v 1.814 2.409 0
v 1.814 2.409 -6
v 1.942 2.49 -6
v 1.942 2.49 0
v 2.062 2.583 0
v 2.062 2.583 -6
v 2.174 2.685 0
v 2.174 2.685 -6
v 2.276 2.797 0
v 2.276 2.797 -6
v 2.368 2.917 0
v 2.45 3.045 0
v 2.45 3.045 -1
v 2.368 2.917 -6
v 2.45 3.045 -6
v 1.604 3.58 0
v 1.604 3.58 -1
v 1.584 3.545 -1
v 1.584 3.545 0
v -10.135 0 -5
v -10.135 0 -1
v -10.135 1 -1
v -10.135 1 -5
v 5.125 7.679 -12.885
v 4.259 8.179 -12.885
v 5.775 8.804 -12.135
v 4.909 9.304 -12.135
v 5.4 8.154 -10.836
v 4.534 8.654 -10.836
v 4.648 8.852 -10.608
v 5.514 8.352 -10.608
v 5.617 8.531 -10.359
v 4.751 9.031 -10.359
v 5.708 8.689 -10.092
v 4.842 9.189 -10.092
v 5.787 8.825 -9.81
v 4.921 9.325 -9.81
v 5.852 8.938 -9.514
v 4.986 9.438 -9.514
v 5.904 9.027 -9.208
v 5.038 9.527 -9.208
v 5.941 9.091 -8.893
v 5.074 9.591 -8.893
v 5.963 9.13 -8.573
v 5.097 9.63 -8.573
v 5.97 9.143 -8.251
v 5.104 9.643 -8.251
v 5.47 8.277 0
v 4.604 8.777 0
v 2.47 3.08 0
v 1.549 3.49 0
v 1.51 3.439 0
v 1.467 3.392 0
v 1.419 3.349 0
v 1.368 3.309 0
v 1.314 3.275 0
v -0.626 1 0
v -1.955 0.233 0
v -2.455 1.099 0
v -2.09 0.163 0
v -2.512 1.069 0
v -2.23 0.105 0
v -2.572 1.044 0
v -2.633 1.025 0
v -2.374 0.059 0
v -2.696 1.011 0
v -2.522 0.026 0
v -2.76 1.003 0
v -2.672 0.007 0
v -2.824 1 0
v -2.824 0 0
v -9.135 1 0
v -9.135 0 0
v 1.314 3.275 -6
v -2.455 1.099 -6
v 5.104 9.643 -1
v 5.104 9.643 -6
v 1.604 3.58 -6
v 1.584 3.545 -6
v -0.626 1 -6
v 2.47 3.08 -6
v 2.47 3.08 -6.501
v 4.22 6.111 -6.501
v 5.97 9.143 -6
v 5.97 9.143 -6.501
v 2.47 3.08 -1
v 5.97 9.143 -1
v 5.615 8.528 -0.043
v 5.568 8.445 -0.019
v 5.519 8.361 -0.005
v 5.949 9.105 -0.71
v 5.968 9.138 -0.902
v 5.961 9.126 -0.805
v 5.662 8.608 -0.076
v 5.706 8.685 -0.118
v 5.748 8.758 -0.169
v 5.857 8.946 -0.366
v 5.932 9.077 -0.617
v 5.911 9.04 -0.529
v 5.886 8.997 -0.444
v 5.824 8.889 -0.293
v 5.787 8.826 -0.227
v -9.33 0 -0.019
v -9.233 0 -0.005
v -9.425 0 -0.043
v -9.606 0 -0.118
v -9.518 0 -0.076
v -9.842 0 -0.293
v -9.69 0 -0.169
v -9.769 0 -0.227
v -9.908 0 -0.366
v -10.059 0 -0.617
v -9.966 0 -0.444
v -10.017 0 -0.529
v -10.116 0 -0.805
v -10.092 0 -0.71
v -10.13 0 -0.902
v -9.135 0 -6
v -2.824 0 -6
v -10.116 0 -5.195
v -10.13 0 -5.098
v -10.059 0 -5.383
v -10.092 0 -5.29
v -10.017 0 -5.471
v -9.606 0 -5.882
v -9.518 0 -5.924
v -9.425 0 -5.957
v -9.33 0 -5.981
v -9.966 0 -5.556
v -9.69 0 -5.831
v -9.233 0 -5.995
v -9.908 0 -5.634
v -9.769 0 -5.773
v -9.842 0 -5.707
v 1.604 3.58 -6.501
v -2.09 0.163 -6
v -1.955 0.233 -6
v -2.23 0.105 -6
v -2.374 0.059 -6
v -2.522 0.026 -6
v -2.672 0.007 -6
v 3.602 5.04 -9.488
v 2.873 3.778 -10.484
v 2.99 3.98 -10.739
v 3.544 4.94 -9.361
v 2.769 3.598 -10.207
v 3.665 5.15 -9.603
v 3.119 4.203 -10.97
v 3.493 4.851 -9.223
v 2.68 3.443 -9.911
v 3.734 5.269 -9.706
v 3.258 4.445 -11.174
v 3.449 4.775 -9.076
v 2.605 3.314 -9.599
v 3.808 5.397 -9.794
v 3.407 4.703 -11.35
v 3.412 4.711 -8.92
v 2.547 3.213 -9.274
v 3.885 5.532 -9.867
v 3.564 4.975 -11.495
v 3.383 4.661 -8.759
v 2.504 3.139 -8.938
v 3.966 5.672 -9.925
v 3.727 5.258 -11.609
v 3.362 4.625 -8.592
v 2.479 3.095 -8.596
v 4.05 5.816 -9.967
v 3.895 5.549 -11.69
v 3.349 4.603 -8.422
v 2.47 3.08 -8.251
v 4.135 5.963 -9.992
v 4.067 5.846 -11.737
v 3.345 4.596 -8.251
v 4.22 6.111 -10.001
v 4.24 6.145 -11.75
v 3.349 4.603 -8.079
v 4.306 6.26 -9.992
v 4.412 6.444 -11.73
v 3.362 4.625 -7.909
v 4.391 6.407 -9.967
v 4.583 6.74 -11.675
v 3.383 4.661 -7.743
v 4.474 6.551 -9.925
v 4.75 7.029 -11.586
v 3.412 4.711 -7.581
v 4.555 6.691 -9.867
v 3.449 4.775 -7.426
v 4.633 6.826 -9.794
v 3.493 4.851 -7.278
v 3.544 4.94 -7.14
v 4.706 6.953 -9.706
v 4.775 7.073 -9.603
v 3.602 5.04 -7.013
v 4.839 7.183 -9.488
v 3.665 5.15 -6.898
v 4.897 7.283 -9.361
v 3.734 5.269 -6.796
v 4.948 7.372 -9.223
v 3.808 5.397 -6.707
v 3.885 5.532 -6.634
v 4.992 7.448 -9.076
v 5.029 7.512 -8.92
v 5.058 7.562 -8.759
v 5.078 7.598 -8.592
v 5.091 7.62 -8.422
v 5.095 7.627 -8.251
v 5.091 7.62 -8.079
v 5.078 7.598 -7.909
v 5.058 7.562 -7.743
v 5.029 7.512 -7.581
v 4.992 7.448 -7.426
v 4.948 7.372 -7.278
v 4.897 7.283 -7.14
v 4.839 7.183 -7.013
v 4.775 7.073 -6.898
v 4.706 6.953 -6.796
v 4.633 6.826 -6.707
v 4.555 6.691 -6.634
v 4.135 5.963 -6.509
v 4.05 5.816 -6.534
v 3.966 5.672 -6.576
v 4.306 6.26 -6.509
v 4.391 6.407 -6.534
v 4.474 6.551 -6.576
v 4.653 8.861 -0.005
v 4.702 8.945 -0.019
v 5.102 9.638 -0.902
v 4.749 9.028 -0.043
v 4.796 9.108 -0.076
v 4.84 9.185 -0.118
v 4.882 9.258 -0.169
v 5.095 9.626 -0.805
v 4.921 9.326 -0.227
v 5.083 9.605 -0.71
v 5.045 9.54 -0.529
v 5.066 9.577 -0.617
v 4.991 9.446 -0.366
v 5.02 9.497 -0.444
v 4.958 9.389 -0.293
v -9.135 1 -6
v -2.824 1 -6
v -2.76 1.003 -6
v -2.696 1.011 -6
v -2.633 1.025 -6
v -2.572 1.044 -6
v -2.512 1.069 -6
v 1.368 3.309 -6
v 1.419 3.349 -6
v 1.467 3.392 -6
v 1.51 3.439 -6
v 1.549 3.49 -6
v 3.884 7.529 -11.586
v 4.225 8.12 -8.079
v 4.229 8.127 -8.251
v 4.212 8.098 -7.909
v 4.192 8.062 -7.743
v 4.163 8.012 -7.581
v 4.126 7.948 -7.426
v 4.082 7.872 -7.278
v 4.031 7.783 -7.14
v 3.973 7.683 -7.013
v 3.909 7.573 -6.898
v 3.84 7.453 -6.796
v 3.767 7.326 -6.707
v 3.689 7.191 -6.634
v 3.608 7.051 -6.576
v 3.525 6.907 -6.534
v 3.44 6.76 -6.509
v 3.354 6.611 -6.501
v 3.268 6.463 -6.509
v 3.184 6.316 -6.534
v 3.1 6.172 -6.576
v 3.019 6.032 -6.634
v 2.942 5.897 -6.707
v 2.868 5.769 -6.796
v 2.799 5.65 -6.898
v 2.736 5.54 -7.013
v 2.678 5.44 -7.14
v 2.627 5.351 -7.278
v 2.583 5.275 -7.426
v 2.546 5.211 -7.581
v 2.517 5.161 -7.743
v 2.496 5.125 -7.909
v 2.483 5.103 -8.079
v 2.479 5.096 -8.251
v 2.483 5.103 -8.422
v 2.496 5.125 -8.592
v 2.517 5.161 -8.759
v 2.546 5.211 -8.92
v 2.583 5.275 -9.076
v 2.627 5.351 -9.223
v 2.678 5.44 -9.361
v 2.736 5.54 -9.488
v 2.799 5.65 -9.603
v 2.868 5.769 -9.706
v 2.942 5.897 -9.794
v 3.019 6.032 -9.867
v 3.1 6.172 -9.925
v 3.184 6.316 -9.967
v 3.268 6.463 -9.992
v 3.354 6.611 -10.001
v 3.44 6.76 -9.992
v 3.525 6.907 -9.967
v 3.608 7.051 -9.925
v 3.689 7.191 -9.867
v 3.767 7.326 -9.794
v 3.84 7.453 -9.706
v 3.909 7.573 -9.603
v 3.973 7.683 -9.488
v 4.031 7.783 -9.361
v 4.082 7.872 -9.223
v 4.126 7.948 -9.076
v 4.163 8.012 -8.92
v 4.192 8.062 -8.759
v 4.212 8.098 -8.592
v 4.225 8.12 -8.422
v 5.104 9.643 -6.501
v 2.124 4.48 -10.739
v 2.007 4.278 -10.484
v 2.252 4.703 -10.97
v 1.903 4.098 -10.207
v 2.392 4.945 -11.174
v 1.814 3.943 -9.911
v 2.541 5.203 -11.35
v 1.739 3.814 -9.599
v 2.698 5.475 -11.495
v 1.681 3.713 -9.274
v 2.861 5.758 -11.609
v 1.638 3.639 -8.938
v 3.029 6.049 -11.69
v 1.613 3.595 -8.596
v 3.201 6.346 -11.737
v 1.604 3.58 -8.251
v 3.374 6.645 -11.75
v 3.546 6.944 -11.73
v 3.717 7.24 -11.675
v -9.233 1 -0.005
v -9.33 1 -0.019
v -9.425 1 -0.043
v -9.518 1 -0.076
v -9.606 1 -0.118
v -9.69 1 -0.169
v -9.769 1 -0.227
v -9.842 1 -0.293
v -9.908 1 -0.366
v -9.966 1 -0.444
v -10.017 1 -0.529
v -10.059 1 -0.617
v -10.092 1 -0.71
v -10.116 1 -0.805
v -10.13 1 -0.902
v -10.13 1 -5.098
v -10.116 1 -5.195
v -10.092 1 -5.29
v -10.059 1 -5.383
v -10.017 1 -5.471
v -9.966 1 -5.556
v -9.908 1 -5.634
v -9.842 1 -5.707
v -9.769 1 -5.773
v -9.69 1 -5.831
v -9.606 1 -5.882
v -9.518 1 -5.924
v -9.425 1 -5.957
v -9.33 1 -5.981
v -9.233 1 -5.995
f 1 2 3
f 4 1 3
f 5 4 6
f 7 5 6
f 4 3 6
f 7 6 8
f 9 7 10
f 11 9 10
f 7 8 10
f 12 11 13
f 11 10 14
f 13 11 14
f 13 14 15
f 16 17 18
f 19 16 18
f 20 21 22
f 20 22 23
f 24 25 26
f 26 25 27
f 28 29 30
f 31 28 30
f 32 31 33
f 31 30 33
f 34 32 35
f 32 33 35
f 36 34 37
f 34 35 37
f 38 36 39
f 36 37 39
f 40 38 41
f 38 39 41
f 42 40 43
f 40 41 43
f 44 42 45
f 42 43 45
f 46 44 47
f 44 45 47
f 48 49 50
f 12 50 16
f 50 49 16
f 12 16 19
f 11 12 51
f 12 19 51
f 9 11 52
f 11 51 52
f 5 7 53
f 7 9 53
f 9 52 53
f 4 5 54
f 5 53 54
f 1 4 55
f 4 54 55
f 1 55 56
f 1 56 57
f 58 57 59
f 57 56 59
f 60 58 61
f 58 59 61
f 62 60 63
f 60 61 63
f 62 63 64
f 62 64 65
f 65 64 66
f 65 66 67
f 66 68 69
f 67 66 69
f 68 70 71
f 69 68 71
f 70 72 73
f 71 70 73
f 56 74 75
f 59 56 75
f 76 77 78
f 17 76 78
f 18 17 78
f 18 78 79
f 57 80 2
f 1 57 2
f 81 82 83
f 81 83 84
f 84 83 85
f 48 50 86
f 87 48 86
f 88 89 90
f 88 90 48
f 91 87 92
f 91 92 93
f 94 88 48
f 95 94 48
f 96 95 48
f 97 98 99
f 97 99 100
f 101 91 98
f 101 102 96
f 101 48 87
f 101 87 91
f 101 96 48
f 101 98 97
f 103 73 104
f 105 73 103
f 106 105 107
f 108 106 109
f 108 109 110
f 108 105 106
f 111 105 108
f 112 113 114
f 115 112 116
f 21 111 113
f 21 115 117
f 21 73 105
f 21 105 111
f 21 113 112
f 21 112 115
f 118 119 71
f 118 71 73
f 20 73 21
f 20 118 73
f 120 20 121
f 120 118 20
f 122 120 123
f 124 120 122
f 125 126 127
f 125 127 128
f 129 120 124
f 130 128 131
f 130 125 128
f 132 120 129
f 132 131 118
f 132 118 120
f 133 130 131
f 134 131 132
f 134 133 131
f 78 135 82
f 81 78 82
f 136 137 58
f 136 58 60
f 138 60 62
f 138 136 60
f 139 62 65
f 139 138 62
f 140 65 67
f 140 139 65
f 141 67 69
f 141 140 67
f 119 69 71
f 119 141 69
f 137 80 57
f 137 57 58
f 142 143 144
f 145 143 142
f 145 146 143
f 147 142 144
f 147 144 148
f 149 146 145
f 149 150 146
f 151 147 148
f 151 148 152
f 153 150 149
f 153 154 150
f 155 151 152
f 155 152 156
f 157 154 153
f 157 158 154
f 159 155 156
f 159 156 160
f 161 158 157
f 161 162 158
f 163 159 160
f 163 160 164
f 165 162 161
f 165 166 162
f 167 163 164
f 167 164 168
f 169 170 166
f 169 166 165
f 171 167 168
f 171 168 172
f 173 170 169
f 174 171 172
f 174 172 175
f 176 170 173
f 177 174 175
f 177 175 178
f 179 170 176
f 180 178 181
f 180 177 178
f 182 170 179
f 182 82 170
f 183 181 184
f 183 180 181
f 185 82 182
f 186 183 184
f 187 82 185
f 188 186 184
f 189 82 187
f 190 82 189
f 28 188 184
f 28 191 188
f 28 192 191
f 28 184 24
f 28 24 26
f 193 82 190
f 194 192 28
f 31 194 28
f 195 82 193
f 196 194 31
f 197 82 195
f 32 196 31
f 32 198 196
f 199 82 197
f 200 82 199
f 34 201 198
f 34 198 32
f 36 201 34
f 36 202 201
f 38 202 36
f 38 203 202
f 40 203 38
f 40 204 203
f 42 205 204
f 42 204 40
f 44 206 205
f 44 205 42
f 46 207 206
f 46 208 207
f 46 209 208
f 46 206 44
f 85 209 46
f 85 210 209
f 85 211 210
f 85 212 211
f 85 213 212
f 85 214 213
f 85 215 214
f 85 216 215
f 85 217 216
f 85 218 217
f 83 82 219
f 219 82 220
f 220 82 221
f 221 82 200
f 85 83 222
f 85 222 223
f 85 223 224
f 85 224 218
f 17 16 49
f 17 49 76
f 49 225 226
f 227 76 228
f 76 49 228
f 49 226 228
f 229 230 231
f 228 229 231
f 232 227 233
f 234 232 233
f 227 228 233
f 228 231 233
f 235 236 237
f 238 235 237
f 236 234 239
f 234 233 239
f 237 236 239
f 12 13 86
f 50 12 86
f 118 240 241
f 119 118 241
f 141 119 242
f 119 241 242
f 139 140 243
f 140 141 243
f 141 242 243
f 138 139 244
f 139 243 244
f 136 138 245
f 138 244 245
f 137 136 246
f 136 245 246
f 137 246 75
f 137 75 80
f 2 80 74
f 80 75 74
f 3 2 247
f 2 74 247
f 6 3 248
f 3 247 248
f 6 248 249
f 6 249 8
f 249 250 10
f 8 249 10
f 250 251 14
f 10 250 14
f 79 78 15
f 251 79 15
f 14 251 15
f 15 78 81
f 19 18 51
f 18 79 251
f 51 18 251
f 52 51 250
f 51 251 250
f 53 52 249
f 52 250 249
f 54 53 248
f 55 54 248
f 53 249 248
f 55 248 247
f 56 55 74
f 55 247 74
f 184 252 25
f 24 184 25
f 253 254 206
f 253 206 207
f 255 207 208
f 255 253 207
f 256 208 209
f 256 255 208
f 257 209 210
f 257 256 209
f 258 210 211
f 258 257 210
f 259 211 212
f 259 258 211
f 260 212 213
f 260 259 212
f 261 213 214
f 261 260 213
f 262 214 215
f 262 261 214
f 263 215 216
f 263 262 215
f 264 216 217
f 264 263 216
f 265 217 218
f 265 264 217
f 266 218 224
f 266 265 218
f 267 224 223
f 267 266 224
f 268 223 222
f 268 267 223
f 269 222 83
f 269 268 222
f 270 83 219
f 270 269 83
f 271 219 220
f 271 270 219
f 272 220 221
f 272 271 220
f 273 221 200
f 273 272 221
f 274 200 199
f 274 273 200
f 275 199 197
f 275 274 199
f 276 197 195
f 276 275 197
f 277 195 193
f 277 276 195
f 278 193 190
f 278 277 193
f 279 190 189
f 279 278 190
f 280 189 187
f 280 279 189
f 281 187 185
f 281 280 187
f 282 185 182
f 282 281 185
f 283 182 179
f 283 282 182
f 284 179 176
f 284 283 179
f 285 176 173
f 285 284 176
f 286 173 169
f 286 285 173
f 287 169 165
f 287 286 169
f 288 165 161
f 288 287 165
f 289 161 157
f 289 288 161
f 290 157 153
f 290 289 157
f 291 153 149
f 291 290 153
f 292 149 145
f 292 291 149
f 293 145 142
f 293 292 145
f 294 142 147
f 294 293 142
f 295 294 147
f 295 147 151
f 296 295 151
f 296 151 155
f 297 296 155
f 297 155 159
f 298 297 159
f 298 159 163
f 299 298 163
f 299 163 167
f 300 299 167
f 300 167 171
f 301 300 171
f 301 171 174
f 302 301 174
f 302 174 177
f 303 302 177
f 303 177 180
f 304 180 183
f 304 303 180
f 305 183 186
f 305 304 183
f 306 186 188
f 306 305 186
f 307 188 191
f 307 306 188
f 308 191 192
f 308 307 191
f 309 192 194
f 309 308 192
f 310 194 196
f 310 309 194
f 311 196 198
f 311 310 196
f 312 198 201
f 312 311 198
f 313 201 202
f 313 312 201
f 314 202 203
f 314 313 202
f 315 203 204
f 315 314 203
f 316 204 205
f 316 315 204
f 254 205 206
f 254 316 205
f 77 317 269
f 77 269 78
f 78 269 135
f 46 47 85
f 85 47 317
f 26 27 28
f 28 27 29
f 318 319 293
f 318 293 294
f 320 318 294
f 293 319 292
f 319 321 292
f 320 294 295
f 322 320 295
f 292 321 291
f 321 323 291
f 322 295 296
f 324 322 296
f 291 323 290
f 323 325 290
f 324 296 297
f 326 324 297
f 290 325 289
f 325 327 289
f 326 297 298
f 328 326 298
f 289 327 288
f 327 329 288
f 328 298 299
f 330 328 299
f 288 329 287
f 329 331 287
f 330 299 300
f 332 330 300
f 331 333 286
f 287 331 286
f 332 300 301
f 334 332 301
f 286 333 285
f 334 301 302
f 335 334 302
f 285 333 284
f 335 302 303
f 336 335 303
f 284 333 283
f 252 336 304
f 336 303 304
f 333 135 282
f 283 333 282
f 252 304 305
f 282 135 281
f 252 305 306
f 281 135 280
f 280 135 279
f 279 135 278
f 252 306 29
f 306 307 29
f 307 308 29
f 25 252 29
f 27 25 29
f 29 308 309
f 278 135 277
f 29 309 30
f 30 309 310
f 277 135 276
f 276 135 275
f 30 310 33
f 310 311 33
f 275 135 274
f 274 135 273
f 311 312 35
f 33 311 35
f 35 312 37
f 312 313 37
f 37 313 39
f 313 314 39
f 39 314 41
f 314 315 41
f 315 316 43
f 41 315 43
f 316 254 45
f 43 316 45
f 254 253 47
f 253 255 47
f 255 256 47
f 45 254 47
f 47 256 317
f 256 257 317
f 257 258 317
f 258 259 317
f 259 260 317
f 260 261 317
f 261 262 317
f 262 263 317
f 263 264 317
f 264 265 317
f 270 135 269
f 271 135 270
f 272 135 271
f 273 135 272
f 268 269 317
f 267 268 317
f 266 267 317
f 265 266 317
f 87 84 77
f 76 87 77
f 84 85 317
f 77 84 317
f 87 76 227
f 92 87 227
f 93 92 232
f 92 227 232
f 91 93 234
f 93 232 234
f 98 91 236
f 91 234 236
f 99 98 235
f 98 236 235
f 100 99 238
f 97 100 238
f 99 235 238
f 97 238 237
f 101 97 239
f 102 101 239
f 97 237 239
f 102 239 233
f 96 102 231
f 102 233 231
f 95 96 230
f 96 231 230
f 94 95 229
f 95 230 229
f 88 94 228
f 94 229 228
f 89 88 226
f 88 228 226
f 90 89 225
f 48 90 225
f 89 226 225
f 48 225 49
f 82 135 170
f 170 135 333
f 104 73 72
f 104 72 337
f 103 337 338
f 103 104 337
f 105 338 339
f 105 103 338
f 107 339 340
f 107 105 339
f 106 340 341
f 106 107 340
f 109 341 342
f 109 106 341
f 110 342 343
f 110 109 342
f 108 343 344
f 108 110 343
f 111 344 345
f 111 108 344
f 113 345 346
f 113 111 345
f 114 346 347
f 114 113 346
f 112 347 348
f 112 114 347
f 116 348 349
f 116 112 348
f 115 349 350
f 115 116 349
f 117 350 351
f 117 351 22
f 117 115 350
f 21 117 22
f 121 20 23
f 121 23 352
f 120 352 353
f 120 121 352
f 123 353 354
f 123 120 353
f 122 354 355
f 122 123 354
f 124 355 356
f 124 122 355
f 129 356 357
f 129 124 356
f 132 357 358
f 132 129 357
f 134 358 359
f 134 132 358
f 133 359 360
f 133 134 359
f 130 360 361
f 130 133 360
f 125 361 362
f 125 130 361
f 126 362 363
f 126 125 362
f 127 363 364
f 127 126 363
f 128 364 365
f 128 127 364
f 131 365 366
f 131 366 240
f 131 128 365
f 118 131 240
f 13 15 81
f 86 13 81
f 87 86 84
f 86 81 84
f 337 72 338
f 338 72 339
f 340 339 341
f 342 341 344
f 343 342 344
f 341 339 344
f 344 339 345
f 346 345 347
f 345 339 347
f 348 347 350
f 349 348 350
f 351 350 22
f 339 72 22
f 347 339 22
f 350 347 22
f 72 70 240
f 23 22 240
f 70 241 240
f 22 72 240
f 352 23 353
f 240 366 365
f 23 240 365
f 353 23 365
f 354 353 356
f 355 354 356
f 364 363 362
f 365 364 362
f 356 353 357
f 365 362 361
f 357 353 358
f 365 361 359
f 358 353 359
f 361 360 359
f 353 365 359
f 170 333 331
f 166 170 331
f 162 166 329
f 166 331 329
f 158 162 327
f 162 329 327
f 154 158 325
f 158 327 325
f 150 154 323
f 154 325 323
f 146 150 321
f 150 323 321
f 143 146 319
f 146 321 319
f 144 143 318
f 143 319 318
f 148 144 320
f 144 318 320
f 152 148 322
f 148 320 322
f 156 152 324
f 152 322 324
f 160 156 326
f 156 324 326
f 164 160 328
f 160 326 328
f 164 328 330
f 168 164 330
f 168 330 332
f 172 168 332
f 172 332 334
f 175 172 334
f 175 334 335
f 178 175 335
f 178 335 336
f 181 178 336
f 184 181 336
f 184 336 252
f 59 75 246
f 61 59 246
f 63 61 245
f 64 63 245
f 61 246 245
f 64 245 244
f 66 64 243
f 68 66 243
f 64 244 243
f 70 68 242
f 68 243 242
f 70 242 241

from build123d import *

# Parameters (mm, degrees)
SKETCH1_R                  = 1.75
BOSS_EXTRUDE1_DEPTH        = 1
BOSS_EXTRUDE2_START        = -1
BOSS_EXTRUDE2_DEPTH        = 1
SKETCHED_START             = 7.177417197
SKETCHED_BEND1_OUTLINE_R   = 1.75
SKETCHED_BEND1_DEPTH       = 1.366025404
SKETCHED_START_2           = -14
SKETCHED_BEND1_2_DEPTH     = 14
SKETCHED_START_3           = -6
SKETCHED_BEND1_3_DEPTH     = 5
SKETCHED_START_4           = -1.253227831
SKETCHED_BEND1_4_DEPTH     = 1.253227831
SKETCHED_START_5           = -6.500618506
SKETCHED_BEND1_5_DEPTH     = 0.500618506
SKETCHED_START_6           = -0.400872669
SKETCHED_BEND1_6_OUTLINE_R = 1.75
SKETCHED_BEND1_6_DEPTH     = 1


with BuildPart() as part:
    # Sketch1 → Boss-Extrude1 (new body)
    with BuildSketch(Plane(origin=(0, 0, 0), x_dir=(1, 0, 0), z_dir=(0, 1, 0))):
        with BuildLine():
            Line((-9.134882229, 6), (2.865117771, 6))
            Line((2.865117771, 6), (2.865117771, 8.250618606))
            ThreePointArc((2.865117771, 8.250618606), (6.365117771, 11.750618606), (9.865117771, 8.250618606))
            Line((9.865117771, 8.250618606), (9.865117771, 6))
            Line((9.865117771, 6), (9.865117771, 1))
            ThreePointArc((9.865117771, 1), (9.572224552, 0.292893219), (8.865117771, 0))
            Line((8.865117771, 0), (-9.134882229, 0))
            ThreePointArc((-9.134882229, 0), (-9.84198901, 0.292893219), (-10.134882229, 1))
            Line((-10.134882229, 1), (-10.134882229, 5))
            ThreePointArc((-10.134882229, 5), (-9.84198901, 5.707106781), (-9.134882229, 6))
        make_face()
        with Locations(Location((6.365117771, 8.250618606, 0), (0, 0, 270))):
            Circle(SKETCH1_R, mode=Mode.SUBTRACT)
    extrude(amount=BOSS_EXTRUDE1_DEPTH)

    # Sketch3 → Boss-Extrude2 (add)
    with BuildSketch(Plane(origin=(0, 1, 0), x_dir=(1, 0, 0), z_dir=(0, 1, 0)).offset(BOSS_EXTRUDE2_START)):
        with BuildLine():
            Line((8.17494801, 12.885336532), (7.42494801, 11.586298426))
            ThreePointArc((7.42494801, 11.586298426), (8.115117771, 11.281707519), (8.723986115, 10.836298426))
            Line((8.723986115, 10.836298426), (9.473986115, 12.135336532))
            Line((9.473986115, 12.135336532), (8.17494801, 12.885336532))
        make_face()
    extrude(amount=BOSS_EXTRUDE2_DEPTH)

    # Sketched Bend1: read off the stored shape, not the designer's step
    # Sketched Bend1 outline → Sketched Bend1 (cut)
    with BuildSketch(Plane(origin=(0, 0, 0), x_dir=(0.49999999999999767, 0.86602540378444, 0), z_dir=(0.8660254037844399, -0.49999999999999795, 0)).offset(SKETCHED_START)):
        with Locations((7.402836748, -8.250618606)):
            Circle(SKETCHED_BEND1_OUTLINE_R)
    extrude(amount=SKETCHED_BEND1_DEPTH, mode=Mode.SUBTRACT)

    # Sketched Bend1 2 outline → Sketched Bend1 2 (cut)
    with BuildSketch(Plane.XY.offset(SKETCHED_START_2)):
        with BuildLine():
            Line((-0.626369748, 1), (-1.955441123, 0.232660284))
            ThreePointArc((-1.955441123, 0.232660284), (-2.374275969, 0.05917321), (-2.823741123, 0))
            Line((-2.823741123, 0), (9.865117771, 0))
            Line((9.865117771, 0), (9.865117771, 1))
            Line((9.865117771, 1), (-0.626369748, 1))
        make_face()
    extrude(amount=SKETCHED_BEND1_2_DEPTH, mode=Mode.SUBTRACT)

    # Sketched Bend1 3 outline → Sketched Bend1 3 (add)
    with BuildSketch(Plane.XY.offset(SKETCHED_START_3)):
        with BuildLine():
            ThreePointArc((1.583564135, 3.544558877), (1.466504678, 3.392004022), (1.313949823, 3.274944565))
            Line((1.313949823, 3.274944565), (-2.455441123, 1.098685688))
            ThreePointArc((-2.455441123, 1.098685688), (-2.633095014, 1.025099036), (-2.823741123, 1))
            Line((-2.823741123, 1), (-0.626369748, 1))
            Line((-0.626369748, 1), (1.813949823, 2.408919161))
            ThreePointArc((1.813949823, 2.408919161), (2.173611459, 2.684897241), (2.449589539, 3.044558877))
            Line((2.449589539, 3.044558877), (5.970277863, 9.142569932))
            Line((5.970277863, 9.142569932), (5.104252459, 9.642569932))
            Line((5.104252459, 9.642569932), (1.583564135, 3.544558877))
        make_face()
    extrude(amount=SKETCHED_BEND1_3_DEPTH)

    # Sketched Bend1 4 outline → Sketched Bend1 4 (add)
    with BuildSketch(Plane.XY.offset(SKETCHED_START_4)):
        with BuildLine():
            ThreePointArc((1.583564135, 3.544558877), (1.466504678, 3.392004022), (1.313949823, 3.274944565))
            Line((1.313949823, 3.274944565), (-2.455441123, 1.098685688))
            ThreePointArc((-2.455441123, 1.098685688), (-2.633095014, 1.025099036), (-2.823741123, 1))
            Line((-2.823741123, 1), (-0.626369748, 1))
            Line((-0.626369748, 1), (1.813949823, 2.408919161))
            ThreePointArc((1.813949823, 2.408919161), (2.173611459, 2.684897241), (2.449589539, 3.044558877))
            Line((2.449589539, 3.044558877), (2.470277863, 3.080392105))
            Line((2.470277863, 3.080392105), (1.604252459, 3.580392105))
            Line((1.604252459, 3.580392105), (1.583564135, 3.544558877))
        make_face()
    extrude(amount=SKETCHED_BEND1_4_DEPTH)

    # Sketched Bend1 5 outline → Sketched Bend1 5 (add)
    with BuildSketch(Plane.XY.offset(SKETCHED_START_5)):
        Polygon((5.104252459, 9.642569932), (1.604252459, 3.580392105), (2.470277863, 3.080392105), (5.970277863, 9.142569932), align=None)
    extrude(amount=SKETCHED_BEND1_5_DEPTH)

    # Sketched Bend1 6 outline → Sketched Bend1 6 (add)
    with BuildSketch(Plane(origin=(0, 0, 0), x_dir=(0.49999999999999767, 0.86602540378444, 0), z_dir=(0.8660254037844399, -0.49999999999999795, 0)).offset(SKETCHED_START_6)):
        with BuildLine():
            Line((3.8614601, 0), (3.8614601, -6))
            Line((3.8614601, -6), (3.902836748, -6))
            Line((3.902836748, -6), (3.902836748, -8.250618606))
            ThreePointArc((3.902836748, -8.250618606), (5.336367033, -11.075455401), (8.462666987, -11.586298426))
            Line((8.462666987, -11.586298426), (9.212666987, -12.885336532))
            Line((9.212666987, -12.885336532), (10.511705093, -12.135336532))
            Line((10.511705093, -12.135336532), (9.761705093, -10.836298426))
            ThreePointArc((9.761705093, -10.836298426), (10.604870415, -9.663764174), (10.902836748, -8.250618606))
            Line((10.902836748, -8.250618606), (10.902836748, -1))
            ThreePointArc((10.902836748, -1), (10.609943529, -0.292893219), (9.902836748, 0))
            Line((9.902836748, 0), (3.8614601, 0))
        make_face()
        with Locations((7.402836748, -8.250618606)):
            Circle(SKETCHED_BEND1_6_OUTLINE_R, mode=Mode.SUBTRACT)
    extrude(amount=SKETCHED_BEND1_6_DEPTH)


solid = part.part
